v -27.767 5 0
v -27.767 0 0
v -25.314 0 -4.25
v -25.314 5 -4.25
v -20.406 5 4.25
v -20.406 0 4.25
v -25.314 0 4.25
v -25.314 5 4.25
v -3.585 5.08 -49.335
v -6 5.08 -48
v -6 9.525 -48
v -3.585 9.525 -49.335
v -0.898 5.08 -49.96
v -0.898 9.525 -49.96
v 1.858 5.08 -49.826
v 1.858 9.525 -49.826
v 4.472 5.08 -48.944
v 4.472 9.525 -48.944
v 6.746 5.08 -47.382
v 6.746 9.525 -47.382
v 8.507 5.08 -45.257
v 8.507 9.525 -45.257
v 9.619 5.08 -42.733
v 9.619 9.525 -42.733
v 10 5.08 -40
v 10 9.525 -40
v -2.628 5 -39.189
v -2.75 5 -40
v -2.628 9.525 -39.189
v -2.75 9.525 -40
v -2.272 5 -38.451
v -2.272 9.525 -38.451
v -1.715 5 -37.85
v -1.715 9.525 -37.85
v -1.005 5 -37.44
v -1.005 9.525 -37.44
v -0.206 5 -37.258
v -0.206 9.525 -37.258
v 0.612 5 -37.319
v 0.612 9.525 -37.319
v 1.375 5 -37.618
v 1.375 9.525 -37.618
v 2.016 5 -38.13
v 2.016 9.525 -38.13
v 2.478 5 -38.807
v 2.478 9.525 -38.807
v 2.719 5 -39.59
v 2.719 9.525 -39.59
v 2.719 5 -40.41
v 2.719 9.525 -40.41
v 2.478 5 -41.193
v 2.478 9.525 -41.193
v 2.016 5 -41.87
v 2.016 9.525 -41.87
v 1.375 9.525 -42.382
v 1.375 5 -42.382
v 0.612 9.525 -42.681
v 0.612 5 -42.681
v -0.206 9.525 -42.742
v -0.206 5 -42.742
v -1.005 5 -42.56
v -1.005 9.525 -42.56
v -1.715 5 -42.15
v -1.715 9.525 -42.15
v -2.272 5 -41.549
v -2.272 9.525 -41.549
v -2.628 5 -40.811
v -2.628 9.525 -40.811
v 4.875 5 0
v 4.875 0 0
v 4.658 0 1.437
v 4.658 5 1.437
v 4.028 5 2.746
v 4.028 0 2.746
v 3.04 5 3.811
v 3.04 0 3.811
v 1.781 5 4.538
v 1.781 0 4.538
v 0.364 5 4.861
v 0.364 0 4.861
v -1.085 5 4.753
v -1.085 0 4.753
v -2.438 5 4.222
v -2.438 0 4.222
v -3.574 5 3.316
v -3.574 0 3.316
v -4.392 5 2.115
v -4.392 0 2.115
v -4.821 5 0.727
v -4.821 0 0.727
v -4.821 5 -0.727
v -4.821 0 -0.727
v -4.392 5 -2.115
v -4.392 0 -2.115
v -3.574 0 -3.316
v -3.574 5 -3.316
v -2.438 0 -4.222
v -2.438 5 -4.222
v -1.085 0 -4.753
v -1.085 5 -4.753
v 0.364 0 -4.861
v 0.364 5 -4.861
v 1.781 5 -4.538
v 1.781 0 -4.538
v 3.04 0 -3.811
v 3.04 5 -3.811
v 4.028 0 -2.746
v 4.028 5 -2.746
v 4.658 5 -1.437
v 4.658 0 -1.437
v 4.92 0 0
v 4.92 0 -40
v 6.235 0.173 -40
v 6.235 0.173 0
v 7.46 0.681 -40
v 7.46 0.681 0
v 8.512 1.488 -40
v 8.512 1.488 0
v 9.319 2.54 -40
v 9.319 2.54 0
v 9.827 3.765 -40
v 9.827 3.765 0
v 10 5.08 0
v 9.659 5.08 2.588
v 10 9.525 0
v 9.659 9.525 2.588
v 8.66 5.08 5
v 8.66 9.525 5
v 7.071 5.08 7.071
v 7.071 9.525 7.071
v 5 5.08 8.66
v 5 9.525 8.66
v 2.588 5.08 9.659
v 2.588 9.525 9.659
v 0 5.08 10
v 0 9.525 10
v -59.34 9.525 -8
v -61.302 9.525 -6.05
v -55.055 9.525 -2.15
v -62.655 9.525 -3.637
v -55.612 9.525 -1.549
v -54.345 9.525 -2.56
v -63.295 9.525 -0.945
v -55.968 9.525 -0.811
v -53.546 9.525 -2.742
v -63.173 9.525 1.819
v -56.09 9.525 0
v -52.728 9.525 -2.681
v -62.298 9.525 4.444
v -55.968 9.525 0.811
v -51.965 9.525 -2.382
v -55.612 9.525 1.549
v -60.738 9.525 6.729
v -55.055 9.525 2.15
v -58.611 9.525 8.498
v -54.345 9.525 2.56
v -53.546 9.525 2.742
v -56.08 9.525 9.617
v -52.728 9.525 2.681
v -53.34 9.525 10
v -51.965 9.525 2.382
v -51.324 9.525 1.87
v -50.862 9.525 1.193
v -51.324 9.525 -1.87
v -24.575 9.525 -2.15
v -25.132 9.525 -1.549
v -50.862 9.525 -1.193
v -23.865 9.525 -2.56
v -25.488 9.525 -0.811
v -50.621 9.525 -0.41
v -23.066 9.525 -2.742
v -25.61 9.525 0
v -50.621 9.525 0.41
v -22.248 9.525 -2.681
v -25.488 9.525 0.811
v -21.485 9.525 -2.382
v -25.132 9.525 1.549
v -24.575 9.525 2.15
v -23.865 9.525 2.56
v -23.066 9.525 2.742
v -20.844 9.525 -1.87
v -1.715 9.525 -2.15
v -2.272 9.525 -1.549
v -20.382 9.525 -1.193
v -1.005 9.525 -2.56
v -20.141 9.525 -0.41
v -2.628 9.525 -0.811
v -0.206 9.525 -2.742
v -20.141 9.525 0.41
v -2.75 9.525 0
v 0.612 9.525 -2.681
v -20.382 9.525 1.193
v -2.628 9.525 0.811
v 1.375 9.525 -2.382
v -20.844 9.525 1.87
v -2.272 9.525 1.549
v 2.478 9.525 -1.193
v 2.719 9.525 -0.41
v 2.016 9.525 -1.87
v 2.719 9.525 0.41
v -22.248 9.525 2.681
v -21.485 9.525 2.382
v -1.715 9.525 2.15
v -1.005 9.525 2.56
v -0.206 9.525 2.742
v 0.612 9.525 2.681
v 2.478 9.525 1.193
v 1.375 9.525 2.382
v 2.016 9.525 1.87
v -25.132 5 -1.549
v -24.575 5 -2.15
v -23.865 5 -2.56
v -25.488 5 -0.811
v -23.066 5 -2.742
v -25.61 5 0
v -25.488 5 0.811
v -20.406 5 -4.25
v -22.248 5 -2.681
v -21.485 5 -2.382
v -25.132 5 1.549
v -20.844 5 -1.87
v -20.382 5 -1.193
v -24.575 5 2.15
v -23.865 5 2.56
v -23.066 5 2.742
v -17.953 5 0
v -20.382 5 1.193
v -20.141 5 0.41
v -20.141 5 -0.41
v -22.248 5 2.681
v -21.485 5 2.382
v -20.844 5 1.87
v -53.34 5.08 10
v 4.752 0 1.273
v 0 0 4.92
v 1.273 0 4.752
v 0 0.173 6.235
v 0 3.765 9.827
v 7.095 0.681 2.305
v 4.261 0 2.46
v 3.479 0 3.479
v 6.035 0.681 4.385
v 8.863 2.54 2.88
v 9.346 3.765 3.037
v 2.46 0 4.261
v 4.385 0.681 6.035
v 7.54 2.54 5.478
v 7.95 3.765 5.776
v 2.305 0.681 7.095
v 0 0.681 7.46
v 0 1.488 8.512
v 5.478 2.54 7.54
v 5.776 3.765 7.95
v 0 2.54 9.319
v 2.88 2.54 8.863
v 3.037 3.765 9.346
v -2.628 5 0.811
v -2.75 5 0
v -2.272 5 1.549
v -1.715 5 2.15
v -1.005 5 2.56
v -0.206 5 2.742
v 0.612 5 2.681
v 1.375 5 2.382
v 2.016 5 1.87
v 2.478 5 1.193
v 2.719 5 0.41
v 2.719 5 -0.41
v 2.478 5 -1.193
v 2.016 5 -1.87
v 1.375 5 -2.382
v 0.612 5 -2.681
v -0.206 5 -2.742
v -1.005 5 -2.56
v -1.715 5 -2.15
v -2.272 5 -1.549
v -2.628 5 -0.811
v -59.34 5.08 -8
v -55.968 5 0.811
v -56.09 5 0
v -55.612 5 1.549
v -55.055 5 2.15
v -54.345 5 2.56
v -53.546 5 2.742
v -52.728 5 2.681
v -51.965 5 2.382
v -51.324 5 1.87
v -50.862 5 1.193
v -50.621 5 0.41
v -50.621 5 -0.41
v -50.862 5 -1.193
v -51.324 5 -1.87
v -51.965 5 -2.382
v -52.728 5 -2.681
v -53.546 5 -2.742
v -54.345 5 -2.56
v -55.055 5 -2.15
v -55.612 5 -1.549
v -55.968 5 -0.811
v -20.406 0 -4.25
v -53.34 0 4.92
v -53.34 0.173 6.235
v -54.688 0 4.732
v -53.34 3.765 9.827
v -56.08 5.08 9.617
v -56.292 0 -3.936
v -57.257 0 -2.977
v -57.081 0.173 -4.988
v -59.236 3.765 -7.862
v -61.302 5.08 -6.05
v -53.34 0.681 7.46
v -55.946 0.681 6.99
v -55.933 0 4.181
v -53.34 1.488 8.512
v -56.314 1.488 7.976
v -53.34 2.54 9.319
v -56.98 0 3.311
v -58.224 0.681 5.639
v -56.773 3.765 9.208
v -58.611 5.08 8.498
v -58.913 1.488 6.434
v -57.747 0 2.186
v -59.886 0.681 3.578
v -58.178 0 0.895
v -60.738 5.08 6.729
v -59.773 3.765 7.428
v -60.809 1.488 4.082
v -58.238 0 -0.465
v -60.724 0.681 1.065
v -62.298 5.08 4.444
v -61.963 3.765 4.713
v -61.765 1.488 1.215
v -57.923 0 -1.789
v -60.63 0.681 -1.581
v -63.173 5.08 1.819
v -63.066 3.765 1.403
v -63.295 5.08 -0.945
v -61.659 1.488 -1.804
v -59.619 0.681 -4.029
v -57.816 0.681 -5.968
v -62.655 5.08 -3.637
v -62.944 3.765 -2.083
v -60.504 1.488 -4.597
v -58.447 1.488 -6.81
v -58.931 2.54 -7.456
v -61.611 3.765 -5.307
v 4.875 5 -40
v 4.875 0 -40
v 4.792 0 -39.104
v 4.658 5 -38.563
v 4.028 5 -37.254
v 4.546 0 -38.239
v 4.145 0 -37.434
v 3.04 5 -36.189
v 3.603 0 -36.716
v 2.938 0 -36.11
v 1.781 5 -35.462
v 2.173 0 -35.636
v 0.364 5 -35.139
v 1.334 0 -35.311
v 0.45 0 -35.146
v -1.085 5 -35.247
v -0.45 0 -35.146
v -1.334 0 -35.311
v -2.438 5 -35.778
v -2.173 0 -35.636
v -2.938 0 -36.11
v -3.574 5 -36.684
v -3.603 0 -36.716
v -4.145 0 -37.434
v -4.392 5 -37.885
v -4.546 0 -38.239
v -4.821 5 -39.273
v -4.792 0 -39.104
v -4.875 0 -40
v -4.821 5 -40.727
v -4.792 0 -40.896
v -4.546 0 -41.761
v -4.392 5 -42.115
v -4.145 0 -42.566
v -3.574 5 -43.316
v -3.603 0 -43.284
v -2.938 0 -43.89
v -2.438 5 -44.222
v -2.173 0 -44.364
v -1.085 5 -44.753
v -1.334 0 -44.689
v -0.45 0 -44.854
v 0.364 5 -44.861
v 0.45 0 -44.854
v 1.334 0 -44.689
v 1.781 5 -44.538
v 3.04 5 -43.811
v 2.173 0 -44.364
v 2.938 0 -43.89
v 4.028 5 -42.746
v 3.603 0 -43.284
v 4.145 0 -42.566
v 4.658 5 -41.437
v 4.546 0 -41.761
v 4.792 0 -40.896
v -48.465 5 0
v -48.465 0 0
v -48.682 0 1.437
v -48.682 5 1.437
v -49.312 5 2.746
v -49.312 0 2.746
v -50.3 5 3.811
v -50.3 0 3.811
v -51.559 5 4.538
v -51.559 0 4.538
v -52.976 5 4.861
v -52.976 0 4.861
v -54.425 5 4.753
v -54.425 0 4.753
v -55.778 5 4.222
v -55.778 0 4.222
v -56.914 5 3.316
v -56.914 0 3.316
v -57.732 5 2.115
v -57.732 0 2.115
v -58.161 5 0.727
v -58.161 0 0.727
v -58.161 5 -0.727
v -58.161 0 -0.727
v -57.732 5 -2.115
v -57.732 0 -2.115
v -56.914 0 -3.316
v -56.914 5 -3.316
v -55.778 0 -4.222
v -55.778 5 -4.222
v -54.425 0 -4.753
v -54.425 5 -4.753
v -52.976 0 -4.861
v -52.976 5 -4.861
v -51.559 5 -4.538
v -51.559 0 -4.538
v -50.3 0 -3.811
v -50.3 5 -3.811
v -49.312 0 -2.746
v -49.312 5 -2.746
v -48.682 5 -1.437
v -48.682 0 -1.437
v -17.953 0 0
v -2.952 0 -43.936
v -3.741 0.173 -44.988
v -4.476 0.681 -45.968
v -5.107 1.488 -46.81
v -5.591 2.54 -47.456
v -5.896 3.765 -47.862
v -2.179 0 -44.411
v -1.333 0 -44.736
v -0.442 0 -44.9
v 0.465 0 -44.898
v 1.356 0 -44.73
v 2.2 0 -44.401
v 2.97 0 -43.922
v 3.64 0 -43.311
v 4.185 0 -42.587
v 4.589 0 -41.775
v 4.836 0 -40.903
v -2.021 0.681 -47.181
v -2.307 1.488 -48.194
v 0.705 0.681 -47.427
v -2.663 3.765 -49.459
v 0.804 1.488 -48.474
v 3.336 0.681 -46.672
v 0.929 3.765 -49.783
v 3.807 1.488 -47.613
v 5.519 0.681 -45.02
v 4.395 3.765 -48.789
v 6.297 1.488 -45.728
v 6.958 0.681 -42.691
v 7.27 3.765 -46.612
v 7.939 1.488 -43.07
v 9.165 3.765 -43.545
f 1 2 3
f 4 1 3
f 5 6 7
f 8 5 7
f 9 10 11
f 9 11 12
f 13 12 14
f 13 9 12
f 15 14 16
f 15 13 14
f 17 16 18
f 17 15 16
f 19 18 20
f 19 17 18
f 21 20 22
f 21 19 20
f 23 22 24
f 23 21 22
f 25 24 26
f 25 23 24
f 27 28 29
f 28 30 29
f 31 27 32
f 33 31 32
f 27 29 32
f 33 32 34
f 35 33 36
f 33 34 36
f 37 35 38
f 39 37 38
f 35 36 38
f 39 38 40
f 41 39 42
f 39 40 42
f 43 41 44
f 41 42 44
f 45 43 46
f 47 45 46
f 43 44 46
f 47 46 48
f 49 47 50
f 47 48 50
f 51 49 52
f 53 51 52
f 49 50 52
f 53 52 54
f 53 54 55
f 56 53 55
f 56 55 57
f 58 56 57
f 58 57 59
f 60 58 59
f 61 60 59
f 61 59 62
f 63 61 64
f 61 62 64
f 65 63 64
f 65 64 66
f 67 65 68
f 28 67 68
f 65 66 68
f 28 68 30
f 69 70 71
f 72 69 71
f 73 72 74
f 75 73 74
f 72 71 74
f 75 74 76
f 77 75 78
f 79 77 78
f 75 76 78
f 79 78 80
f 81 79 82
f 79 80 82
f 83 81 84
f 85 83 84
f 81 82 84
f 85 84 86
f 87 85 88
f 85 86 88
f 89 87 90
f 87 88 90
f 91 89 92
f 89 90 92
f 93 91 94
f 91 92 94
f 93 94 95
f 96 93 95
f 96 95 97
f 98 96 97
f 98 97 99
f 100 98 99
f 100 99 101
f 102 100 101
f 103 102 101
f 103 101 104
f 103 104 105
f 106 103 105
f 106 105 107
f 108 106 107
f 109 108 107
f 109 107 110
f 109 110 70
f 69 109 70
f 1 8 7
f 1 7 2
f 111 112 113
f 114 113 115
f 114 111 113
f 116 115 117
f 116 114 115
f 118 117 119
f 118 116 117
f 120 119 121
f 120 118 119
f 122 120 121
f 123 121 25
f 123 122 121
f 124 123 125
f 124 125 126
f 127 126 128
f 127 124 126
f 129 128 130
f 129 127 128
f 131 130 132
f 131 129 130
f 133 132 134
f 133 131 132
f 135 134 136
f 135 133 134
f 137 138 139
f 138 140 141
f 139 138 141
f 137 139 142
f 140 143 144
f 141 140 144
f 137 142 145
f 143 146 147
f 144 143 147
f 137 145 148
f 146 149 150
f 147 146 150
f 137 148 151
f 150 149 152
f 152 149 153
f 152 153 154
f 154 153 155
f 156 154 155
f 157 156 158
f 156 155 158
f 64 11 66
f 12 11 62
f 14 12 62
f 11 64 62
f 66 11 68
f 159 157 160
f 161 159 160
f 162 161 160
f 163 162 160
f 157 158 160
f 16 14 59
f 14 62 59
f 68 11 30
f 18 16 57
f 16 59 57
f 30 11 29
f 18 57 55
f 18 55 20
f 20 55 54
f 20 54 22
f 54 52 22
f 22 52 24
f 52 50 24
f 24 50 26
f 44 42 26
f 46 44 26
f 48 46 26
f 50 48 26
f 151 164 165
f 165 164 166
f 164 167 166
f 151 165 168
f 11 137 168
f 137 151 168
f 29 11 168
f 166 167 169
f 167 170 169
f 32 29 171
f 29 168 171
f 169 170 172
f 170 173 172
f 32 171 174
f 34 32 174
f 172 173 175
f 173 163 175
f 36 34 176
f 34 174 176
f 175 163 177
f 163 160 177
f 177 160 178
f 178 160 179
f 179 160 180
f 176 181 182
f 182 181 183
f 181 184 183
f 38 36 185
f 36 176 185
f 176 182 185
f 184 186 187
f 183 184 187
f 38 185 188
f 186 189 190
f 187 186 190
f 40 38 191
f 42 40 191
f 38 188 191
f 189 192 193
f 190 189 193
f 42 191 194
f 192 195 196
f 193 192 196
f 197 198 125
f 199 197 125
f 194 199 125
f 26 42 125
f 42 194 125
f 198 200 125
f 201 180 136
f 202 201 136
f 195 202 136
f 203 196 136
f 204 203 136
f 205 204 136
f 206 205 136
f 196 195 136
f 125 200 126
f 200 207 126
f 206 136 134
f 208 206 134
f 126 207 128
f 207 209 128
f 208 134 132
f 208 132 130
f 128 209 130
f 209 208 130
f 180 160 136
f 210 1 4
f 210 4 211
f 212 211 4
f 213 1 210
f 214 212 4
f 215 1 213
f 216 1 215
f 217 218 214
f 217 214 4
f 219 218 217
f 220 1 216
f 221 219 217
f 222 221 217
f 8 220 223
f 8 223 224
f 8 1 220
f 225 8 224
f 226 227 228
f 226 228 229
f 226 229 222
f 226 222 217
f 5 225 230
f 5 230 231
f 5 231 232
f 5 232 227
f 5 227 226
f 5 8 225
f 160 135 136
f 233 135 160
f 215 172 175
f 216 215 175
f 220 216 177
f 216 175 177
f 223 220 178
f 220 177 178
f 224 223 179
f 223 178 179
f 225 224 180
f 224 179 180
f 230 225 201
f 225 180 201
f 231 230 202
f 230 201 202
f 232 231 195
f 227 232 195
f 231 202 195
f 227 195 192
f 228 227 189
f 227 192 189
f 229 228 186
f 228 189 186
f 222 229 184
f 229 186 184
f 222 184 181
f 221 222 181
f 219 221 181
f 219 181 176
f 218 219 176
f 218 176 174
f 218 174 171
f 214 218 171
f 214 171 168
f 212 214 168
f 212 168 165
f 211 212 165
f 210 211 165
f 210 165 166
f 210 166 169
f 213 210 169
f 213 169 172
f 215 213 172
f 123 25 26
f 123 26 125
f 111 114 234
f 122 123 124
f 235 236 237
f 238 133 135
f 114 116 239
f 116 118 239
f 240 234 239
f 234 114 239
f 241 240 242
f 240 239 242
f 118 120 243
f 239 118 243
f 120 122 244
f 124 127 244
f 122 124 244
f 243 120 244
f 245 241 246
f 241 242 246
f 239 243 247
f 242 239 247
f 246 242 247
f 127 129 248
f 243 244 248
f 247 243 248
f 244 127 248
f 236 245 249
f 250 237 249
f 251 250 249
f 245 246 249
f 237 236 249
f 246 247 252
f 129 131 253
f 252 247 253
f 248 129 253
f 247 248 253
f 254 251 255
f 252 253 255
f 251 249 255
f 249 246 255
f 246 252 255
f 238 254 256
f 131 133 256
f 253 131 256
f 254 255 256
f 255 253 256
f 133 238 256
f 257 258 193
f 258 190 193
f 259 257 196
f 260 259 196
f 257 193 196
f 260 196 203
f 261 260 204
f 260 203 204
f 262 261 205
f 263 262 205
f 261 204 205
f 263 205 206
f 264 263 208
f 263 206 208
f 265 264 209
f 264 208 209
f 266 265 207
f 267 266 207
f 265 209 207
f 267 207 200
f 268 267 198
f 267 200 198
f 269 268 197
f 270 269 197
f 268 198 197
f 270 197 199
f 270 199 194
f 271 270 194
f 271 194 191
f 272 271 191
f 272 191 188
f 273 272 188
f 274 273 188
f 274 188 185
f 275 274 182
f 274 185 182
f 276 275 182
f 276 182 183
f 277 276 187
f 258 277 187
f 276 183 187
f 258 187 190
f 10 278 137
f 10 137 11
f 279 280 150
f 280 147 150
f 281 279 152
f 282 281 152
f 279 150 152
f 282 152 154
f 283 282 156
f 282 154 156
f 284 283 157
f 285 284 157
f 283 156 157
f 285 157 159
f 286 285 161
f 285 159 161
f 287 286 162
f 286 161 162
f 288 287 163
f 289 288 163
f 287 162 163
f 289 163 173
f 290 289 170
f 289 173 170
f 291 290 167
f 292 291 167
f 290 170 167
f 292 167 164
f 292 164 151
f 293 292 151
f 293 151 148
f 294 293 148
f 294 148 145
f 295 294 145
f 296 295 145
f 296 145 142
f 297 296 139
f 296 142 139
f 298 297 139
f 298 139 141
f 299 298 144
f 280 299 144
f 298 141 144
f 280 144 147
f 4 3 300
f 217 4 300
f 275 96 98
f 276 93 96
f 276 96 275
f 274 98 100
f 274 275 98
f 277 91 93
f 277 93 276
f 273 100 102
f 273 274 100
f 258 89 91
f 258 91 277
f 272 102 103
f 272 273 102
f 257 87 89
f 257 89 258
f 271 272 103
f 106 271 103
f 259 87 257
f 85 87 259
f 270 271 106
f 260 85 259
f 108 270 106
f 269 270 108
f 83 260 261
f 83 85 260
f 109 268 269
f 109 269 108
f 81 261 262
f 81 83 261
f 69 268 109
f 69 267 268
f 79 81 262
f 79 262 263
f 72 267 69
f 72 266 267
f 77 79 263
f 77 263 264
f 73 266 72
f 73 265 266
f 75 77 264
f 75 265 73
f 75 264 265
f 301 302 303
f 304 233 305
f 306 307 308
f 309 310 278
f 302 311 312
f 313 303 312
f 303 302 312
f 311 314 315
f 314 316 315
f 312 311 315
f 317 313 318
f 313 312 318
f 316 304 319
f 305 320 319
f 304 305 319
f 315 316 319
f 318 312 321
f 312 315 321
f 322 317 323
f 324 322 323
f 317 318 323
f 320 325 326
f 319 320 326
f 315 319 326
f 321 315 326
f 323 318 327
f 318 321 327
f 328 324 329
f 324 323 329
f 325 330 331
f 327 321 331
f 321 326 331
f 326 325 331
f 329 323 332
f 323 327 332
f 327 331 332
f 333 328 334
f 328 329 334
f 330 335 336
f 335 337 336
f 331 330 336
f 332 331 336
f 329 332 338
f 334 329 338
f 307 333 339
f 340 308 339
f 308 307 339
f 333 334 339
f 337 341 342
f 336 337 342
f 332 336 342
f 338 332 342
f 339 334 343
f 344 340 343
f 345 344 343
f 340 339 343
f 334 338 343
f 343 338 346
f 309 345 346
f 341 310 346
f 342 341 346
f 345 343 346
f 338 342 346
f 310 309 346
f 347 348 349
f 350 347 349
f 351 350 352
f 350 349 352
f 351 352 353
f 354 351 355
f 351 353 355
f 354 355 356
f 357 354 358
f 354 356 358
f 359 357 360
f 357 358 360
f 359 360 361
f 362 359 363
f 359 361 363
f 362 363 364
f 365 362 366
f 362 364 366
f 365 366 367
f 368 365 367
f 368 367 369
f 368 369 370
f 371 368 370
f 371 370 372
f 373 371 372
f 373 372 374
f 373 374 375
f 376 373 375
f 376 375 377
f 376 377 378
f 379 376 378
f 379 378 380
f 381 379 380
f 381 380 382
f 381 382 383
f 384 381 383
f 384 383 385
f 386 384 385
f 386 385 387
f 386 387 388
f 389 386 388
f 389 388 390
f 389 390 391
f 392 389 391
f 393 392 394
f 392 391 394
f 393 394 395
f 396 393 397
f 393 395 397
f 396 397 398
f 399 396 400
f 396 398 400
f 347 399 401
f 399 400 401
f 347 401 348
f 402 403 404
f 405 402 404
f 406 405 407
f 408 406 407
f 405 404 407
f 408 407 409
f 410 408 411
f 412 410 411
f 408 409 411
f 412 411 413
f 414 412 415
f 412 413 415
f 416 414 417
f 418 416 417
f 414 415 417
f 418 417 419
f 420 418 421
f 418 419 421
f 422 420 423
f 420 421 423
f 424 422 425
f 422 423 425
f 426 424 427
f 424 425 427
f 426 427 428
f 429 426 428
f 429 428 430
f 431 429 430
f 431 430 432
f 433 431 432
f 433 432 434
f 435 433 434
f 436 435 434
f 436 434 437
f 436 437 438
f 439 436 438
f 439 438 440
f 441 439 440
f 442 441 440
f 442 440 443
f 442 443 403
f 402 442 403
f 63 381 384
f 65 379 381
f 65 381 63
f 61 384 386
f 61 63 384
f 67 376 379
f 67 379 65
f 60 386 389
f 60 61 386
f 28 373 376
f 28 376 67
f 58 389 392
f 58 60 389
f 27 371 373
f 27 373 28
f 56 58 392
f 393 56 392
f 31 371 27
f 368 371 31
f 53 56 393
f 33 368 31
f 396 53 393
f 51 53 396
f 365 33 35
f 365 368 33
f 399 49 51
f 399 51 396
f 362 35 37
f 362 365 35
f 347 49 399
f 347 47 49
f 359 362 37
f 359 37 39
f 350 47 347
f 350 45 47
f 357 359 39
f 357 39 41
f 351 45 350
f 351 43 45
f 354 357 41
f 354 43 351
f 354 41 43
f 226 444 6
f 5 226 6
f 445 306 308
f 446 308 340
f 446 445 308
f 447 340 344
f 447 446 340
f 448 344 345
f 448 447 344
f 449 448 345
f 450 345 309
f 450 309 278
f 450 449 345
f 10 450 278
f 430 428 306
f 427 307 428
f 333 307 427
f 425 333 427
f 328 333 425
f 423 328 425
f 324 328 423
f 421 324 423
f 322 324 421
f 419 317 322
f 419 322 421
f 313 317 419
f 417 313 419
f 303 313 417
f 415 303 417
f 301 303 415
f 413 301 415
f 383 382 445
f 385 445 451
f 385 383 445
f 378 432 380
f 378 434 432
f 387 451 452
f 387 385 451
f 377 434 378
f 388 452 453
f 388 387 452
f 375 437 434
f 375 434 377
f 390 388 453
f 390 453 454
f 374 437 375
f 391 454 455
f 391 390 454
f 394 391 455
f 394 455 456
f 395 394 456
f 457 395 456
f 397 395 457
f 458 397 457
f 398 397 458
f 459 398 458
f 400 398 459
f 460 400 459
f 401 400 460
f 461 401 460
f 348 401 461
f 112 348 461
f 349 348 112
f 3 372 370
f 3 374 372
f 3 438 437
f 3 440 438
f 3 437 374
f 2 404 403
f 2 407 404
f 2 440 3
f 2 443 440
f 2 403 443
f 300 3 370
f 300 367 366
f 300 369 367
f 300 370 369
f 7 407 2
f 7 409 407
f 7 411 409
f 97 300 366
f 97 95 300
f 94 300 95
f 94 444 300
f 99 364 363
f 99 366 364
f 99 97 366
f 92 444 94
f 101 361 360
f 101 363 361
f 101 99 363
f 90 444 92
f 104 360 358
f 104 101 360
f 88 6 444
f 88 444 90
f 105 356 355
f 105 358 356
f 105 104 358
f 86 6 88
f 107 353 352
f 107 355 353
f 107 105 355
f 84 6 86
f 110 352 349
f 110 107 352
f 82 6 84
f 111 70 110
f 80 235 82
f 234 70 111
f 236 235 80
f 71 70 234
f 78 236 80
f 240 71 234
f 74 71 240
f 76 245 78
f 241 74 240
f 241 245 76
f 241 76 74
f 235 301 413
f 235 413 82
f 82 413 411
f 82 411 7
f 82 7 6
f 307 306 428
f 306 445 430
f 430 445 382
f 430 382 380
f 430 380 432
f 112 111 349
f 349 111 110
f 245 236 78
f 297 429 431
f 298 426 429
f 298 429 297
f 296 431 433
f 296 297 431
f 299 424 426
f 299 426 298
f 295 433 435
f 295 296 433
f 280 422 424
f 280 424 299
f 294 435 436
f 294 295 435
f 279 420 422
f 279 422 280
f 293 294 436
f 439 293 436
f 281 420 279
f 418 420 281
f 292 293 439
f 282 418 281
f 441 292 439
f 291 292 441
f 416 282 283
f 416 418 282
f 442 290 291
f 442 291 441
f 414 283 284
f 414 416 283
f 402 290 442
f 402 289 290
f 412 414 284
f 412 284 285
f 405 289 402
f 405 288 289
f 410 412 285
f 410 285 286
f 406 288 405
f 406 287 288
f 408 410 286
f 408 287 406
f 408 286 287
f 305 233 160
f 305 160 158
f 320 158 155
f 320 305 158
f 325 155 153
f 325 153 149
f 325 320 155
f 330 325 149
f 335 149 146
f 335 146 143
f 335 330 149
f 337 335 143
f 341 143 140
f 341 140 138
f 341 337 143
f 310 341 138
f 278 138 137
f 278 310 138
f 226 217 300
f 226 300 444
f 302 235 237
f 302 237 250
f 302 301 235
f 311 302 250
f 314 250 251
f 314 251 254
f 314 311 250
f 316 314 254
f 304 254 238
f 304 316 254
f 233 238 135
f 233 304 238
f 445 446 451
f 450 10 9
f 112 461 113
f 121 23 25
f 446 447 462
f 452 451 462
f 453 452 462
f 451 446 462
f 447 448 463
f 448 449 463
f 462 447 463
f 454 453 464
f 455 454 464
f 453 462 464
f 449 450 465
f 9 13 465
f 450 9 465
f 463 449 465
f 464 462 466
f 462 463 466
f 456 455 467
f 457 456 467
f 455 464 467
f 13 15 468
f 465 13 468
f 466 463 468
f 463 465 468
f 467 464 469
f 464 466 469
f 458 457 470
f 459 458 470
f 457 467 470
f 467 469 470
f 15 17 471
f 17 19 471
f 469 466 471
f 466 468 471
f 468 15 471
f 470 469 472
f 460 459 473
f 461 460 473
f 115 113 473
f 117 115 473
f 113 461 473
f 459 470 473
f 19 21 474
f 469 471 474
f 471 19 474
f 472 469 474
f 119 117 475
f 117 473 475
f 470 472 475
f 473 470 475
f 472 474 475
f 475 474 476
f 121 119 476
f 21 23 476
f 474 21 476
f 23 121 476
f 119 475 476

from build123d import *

# Parameters (mm, degrees)
F1_DEPTH       = 9.525
F2_D           = 5.5
F2_CBORE_D     = 9.75
F2_CBORE_DEPTH = 5
F3_R           = 5.08
F4_DEPTH       = 5
F5_D           = 5.5


# Not quite as in the source:
# - a feature names something its author has since deleted; it is built from what else it names


with BuildPart() as f1:
    # F0 (on Front) → F1 (new body)
    with BuildSketch(Plane.XZ):
        with BuildLine():
            Line((10, -40), (10, 0))
            ThreePointArc((10, 0), (7.0710678119, 7.0710678119), (0, 10))
            Line((0, 10), (-53.34, 10))
            ThreePointArc((-53.34, 10), (-62.826927837, 3.1619930765), (-59.3395200276, -8.0003599568))
            Line((-59.3395200276, -8.0003599568), (-5.9995200276, -48.0003599568))
            ThreePointArc((-5.9995200276, -48.0003599568), (4.4724042597, -48.9441377526), (10, -40))
        make_face()
        Polygon((-17.9525227119, 0), (-20.4062613559, -4.25), (-25.3137386441, -4.25), (-27.7674772881, 0), (-25.3137386441, 4.25), (-20.4062613559, 4.25), align=None, mode=Mode.SUBTRACT)
        Polygon((-25.3137386441, -4.25), (-20.4062613559, -4.25), (-17.9525227119, 0), (-20.4062613559, 4.25), (-25.3137386441, 4.25), (-27.7674772881, 0), align=None)
    extrude(amount=-F1_DEPTH)

    # F2 (through all)
    with Locations(Plane.XZ):
        with Locations((0, 0), (0, -40), (-53.34, 0)):
            CounterBoreHole(F2_D / 2, F2_CBORE_D / 2, F2_CBORE_DEPTH)

    # F3
    f3_edges = [f1.edges().sort_by_distance(p)[0] for p in [
        (-26.67, 0, 10),
    ]]
    fillet(f3_edges, radius=F3_R)

    # F0 (on Front) → F4 (cut)
    with BuildSketch(Plane.XZ):
        Polygon((-25.3137386441, -4.25), (-20.4062613559, -4.25), (-17.9525227119, 0), (-20.4062613559, 4.25), (-25.3137386441, 4.25), (-27.7674772881, 0), align=None)
    extrude(amount=-F4_DEPTH, mode=Mode.SUBTRACT)

    # F5 (through all)
    with Locations(Plane.XZ):
        with Locations((-22.86, 0)):
            Hole(F5_D / 2)


solid = f1.part
